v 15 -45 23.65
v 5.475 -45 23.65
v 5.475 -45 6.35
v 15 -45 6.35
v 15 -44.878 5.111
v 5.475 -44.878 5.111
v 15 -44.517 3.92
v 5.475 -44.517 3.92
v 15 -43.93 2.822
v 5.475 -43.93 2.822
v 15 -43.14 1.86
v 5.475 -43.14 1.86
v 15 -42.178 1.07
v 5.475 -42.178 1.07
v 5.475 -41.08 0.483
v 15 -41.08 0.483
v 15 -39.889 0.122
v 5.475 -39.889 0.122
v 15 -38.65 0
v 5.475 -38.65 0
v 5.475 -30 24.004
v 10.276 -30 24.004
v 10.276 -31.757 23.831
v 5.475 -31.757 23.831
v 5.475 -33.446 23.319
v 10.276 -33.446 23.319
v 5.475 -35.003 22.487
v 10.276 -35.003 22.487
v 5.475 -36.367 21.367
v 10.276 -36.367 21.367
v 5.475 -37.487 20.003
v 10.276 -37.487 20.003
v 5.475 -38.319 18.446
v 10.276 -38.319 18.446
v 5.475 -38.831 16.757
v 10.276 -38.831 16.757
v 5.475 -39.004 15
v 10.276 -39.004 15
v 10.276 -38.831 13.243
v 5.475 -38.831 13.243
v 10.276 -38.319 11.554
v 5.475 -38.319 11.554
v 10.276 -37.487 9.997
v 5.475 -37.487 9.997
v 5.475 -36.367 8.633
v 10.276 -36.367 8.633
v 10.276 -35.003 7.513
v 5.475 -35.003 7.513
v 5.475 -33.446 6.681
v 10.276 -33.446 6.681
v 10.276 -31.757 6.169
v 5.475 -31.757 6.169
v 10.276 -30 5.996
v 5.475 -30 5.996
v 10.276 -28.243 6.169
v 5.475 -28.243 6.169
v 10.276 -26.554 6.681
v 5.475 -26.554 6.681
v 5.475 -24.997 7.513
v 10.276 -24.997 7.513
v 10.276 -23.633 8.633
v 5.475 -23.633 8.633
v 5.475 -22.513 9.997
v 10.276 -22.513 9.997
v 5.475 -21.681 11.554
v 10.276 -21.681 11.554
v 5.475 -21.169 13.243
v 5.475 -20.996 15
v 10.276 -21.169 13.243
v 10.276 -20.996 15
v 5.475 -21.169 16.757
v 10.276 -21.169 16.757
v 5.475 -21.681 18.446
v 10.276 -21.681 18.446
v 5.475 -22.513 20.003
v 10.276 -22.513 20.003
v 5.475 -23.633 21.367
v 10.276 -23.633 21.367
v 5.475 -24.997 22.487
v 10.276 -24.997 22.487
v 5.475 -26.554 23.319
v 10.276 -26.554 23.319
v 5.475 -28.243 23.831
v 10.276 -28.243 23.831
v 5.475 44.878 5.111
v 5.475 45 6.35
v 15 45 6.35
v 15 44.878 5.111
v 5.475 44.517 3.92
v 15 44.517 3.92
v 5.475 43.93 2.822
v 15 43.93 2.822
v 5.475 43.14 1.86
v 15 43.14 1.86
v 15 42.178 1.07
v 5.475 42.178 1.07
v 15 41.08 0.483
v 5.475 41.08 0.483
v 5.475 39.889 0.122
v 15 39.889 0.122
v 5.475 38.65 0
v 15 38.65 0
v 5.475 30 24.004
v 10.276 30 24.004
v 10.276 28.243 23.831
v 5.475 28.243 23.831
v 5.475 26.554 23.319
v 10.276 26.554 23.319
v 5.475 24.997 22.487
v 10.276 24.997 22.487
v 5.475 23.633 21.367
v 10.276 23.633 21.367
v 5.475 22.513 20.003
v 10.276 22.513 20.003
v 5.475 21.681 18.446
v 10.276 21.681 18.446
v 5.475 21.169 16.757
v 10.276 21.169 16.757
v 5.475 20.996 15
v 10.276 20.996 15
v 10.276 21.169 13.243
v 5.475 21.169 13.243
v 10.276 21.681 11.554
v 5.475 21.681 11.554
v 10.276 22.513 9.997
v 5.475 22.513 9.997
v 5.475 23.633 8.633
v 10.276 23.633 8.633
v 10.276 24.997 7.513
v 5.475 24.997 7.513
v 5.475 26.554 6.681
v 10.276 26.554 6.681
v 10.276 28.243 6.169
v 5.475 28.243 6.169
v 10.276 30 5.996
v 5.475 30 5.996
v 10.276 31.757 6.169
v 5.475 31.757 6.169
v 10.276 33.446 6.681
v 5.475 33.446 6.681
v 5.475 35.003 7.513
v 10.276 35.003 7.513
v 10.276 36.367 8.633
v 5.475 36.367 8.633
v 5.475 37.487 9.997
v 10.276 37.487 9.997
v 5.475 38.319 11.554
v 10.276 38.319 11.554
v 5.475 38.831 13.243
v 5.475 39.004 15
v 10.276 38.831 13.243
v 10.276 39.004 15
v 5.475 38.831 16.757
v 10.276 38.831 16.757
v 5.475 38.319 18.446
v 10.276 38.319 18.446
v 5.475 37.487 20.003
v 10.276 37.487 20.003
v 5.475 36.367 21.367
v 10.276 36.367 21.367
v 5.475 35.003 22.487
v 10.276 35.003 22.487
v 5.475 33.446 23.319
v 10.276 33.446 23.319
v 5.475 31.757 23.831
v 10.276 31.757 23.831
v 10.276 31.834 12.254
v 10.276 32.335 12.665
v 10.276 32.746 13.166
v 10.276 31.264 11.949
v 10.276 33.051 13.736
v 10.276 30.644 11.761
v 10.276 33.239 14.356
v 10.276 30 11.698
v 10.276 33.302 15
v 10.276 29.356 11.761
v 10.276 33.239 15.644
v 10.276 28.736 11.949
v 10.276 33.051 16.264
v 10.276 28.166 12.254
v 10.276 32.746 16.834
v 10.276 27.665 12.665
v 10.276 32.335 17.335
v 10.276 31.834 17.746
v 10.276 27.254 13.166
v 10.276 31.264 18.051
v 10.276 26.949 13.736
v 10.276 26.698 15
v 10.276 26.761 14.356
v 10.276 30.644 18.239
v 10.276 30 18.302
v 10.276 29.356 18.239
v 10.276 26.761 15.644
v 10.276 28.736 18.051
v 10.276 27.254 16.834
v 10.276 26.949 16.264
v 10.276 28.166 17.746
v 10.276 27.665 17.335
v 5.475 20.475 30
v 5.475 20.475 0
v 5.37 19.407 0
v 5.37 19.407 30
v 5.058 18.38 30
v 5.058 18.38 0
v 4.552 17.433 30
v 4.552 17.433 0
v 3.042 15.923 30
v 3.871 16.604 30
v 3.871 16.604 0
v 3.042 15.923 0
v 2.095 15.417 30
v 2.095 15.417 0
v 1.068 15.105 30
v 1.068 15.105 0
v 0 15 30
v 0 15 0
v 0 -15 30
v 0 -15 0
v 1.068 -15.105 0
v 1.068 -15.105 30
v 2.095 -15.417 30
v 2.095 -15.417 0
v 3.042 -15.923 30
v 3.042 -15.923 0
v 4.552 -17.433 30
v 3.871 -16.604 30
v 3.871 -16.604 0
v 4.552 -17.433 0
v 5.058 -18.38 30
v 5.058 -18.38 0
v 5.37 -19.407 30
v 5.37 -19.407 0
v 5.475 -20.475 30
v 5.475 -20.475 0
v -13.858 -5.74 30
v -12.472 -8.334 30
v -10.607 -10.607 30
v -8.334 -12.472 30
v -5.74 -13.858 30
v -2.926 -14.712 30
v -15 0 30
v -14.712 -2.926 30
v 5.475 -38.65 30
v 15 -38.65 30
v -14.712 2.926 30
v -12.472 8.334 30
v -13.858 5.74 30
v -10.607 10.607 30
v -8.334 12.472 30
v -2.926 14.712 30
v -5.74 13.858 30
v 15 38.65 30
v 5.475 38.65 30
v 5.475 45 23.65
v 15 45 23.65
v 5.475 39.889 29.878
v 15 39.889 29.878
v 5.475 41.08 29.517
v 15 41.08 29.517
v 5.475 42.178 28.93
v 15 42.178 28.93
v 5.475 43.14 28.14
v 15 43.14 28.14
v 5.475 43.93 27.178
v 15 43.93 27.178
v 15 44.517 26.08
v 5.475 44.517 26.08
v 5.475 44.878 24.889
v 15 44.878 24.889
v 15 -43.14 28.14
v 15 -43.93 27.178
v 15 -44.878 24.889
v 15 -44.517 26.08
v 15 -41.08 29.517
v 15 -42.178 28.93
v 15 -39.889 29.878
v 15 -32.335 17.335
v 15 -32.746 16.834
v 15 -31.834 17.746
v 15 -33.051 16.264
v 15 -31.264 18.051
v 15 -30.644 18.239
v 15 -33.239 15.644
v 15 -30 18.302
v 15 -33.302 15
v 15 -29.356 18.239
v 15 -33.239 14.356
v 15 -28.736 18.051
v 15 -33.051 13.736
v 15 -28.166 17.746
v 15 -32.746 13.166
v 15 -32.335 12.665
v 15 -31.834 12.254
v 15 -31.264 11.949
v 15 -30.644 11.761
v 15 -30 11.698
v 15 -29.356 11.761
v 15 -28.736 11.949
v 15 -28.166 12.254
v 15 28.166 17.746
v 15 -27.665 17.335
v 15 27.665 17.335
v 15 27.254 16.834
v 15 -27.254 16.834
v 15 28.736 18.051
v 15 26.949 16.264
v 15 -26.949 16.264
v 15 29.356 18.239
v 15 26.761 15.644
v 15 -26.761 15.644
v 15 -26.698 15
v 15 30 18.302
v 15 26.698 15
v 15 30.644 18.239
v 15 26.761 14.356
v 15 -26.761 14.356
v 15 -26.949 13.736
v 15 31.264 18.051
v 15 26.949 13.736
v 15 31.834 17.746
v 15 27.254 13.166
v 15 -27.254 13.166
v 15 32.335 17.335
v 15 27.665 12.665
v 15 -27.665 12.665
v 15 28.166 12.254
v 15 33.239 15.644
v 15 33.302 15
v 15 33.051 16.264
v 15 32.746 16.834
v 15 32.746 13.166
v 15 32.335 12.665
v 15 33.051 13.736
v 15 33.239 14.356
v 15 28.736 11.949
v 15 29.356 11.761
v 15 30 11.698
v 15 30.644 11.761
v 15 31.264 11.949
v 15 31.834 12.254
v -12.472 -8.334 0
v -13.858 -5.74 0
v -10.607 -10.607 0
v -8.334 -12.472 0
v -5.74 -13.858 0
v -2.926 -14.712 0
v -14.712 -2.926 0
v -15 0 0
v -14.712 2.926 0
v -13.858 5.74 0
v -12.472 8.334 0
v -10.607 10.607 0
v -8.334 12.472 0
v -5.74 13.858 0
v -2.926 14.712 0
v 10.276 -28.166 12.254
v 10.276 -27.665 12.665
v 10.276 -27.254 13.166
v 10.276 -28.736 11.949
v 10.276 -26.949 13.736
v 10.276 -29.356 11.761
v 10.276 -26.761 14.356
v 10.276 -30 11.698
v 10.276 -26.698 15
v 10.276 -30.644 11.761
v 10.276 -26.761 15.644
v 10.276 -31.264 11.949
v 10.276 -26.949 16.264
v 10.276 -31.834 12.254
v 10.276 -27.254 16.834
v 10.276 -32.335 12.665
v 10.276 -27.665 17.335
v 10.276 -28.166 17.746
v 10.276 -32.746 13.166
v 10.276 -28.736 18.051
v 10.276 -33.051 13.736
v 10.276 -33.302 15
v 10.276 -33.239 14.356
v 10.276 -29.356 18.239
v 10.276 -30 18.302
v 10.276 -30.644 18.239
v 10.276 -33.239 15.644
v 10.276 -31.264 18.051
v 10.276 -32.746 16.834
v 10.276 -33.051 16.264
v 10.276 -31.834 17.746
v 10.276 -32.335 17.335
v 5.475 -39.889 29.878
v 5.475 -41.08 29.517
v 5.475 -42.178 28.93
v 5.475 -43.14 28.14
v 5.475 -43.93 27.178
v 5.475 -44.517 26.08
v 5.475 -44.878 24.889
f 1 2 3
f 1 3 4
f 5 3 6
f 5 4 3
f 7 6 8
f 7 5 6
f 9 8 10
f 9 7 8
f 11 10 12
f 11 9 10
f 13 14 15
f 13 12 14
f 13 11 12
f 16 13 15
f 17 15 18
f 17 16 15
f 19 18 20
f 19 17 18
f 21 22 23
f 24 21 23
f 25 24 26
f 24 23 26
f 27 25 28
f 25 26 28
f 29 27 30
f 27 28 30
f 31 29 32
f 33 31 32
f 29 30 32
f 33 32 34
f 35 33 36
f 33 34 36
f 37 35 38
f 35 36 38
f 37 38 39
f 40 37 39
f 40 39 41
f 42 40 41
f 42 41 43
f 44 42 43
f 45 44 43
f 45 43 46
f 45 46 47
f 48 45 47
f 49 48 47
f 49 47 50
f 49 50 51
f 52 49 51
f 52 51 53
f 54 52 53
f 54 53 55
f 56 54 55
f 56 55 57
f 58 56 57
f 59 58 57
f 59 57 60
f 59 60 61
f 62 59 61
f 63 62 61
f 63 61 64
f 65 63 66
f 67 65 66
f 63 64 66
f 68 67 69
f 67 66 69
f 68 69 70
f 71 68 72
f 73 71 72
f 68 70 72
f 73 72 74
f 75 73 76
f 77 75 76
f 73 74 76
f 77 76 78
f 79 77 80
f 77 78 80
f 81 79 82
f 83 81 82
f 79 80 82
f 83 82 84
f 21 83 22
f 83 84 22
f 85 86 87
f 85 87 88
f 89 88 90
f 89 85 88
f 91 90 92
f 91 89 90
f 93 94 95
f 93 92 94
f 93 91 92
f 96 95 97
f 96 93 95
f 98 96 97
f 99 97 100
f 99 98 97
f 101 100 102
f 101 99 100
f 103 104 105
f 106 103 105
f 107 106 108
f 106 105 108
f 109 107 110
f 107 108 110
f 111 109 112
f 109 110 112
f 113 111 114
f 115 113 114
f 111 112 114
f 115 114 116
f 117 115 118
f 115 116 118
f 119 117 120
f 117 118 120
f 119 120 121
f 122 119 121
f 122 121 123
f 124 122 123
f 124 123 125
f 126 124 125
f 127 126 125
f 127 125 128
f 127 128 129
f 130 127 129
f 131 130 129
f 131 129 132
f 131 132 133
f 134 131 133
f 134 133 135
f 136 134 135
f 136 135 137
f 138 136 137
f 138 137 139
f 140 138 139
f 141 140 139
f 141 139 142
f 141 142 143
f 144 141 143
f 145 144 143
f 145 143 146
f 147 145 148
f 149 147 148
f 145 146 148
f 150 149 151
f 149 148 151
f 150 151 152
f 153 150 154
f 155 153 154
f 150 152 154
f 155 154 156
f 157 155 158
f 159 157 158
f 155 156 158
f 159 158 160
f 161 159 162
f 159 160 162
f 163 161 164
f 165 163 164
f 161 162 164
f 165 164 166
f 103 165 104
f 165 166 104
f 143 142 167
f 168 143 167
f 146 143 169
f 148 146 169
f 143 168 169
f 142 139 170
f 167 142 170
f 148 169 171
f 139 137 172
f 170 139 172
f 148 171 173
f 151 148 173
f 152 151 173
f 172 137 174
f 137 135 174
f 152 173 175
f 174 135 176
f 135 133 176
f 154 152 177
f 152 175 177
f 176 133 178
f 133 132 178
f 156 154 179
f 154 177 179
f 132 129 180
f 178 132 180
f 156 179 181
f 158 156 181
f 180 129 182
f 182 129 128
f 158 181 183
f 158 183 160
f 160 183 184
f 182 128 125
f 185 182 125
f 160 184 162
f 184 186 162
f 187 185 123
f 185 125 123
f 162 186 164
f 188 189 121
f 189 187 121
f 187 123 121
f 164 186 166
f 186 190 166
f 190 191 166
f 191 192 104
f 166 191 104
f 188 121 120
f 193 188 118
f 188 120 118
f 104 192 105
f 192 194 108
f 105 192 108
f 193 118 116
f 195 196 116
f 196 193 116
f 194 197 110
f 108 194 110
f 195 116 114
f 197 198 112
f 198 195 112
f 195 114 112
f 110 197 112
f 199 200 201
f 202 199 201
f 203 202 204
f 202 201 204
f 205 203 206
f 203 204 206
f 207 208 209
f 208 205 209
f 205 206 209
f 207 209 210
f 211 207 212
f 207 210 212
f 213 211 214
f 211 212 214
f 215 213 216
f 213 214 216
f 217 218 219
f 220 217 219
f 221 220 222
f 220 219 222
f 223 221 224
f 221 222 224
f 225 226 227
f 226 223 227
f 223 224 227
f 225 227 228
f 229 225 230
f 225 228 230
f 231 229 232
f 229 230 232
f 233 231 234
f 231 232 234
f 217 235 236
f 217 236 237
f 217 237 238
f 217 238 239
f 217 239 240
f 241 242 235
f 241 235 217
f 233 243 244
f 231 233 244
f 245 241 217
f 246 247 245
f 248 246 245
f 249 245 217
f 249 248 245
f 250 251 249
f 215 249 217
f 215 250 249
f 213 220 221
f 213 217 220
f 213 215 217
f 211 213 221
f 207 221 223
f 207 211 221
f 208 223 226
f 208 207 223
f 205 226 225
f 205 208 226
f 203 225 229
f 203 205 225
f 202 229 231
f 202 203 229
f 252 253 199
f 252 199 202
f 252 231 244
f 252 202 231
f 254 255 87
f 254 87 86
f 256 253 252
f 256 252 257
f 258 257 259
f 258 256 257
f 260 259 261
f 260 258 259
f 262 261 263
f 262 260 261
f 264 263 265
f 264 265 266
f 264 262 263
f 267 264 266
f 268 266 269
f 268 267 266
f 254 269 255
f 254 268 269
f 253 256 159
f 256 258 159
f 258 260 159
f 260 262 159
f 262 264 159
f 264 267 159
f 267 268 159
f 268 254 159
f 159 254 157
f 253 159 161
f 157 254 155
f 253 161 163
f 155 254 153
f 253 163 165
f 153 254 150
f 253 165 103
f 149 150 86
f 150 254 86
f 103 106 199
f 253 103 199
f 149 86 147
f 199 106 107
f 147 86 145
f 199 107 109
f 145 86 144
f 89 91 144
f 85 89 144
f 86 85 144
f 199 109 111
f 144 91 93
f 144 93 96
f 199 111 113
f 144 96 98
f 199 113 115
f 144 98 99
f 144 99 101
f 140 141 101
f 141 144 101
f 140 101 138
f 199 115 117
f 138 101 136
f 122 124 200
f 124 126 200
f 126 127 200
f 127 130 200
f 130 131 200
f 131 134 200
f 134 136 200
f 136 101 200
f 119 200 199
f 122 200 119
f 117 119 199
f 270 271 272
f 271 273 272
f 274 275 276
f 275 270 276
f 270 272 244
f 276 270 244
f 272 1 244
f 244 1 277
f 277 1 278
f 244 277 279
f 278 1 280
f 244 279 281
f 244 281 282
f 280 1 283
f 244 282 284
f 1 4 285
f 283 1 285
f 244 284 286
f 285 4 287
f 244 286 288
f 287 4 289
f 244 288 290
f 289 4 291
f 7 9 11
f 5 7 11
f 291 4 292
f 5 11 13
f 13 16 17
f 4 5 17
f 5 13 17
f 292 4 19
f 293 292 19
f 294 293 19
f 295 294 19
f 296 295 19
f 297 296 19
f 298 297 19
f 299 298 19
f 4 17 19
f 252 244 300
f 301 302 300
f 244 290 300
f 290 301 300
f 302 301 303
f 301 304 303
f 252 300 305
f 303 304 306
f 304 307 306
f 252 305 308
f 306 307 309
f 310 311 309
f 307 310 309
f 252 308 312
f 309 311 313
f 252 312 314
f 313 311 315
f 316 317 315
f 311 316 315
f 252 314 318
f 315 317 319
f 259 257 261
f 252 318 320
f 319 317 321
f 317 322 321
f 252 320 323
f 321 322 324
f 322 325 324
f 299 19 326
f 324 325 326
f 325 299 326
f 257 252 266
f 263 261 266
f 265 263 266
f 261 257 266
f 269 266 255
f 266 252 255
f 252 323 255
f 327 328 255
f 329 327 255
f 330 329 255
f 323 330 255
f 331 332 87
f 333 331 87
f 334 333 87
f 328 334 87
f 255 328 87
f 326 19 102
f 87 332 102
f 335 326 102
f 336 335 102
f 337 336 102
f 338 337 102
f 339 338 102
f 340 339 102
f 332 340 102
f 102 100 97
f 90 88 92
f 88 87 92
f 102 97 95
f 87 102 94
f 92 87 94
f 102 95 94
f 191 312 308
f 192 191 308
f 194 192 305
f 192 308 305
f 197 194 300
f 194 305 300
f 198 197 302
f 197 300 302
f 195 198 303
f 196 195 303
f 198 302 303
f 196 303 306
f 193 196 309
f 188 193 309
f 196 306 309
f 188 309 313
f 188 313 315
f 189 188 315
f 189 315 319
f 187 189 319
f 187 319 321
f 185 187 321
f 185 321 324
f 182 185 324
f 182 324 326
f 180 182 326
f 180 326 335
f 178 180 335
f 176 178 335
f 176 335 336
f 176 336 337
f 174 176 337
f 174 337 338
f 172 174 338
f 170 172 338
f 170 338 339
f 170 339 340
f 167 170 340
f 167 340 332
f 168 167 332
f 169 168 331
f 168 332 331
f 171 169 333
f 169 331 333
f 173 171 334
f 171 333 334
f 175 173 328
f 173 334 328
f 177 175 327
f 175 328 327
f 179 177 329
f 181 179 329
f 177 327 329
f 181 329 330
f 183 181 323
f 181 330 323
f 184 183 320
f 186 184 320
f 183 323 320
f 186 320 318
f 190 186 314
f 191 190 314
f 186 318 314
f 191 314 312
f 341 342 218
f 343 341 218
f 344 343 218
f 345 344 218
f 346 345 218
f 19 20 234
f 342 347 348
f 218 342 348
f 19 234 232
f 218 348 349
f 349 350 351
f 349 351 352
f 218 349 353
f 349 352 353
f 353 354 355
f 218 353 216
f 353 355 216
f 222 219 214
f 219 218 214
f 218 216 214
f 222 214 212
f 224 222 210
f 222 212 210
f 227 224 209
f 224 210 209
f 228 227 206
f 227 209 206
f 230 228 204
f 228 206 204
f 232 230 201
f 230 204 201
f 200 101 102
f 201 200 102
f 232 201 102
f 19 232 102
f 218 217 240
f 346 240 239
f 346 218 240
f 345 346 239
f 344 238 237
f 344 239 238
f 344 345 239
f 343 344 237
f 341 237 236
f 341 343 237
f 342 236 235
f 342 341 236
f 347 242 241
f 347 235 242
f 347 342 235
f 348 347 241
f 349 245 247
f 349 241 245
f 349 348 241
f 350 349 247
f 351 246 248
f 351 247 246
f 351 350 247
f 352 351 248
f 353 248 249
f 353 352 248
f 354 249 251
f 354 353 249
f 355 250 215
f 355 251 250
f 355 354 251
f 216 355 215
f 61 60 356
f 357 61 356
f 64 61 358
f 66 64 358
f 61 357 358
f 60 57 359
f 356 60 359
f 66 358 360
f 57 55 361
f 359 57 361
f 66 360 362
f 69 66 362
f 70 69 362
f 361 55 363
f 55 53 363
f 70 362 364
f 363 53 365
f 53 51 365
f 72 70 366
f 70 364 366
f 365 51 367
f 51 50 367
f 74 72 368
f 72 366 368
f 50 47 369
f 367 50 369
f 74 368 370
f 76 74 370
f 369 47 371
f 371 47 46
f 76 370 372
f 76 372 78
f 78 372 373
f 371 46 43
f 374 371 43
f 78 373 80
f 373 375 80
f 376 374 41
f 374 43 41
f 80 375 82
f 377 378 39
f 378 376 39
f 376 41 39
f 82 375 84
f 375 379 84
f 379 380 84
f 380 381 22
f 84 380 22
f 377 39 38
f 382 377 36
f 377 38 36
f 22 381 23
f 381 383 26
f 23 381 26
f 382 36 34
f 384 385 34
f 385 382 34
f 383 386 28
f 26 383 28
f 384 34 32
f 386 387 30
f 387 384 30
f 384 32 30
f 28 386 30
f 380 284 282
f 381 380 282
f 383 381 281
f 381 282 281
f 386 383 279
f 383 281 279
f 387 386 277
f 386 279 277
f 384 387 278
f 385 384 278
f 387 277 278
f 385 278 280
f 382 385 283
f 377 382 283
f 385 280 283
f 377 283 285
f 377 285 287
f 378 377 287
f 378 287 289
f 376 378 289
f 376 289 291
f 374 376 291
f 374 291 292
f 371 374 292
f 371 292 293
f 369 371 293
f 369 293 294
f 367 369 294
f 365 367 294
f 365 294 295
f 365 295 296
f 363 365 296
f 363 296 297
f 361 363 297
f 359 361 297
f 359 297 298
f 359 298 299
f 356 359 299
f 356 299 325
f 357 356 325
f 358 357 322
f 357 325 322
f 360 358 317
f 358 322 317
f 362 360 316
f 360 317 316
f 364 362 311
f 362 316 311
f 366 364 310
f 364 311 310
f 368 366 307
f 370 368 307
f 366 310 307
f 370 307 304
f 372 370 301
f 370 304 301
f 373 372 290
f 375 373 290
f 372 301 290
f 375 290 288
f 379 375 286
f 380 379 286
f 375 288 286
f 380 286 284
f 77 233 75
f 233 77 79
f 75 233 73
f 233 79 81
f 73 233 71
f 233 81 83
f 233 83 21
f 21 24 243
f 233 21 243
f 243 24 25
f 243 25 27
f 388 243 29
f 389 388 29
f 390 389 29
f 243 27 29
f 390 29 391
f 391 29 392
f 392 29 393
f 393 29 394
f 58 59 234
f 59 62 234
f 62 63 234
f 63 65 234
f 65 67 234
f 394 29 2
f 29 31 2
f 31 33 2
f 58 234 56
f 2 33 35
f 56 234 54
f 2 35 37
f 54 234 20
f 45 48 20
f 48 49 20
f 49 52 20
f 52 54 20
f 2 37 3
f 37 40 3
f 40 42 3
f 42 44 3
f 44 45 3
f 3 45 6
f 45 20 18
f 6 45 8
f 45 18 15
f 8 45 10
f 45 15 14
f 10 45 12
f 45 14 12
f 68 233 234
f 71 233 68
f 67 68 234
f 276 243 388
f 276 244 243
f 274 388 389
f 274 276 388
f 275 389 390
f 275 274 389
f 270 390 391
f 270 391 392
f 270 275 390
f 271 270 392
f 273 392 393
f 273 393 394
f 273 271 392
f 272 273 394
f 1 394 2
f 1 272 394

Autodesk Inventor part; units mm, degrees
ref_plane "YZ Plane" through (0, 0, 0) normal (1, 0, 0) x (0, 1, 0)
ref_plane "XZ Plane" through (0, 0, 0) normal (0, 1, 0) x (-1, 0, 0)
ref_plane "XY Plane" through (0, 0, 0) normal (0, 0, 1) x (1, 0, 0)
sketch "Sketch1" plane through (0, 0, 0) normal (0, 0, 1) x (1, 0, 0)
  line L0 (5.475, -45) -> (15, -45)
  line L1 (15, -45) -> (15, 45)
  line L2 (15, 45) -> (5.475, 45)
  line L3 (5.475, -45) -> (15, 45) construction
  line L4 (15, -45) -> (5.475, 45) construction
  arc A0 (0, 15) -> (5.475, 20.475) centre (0, 20.475) ccw
  line L5 (5.475, 0) -> (15, 0) construction
  arc A1 (5.475, -20.475) -> (0, -15) centre (0, -20.475) ccw
  line L6 (5.475, 45) -> (5.475, 20.475)
  line L7 (5.475, -20.475) -> (5.475, -45)
  arc A2 (0, 15) -> (0, -15) centre (0, 0) ccw
  point P0 (10.2375, 0)
  point P1 (10.2375, 0)
  dimension "d1" = 90
  dimension "d2" = 9.525
  dimension "d3" = 15
extrude "Extrusion1" add sketch "Sketch1" along normal blind 30
sketch "Sketch2" plane through (5.475, 20.475, 0) normal (-1, 0, 0) x (0, 0, 1)
  line L0 (0, -65.475) -> (30, -65.475) projected
  line L1 (0, 24.525) -> (30, 24.525) projected
  point P0 (0, -20.475)
  point P1 (15, 9.525)
  point P2 (15, -50.475)
  point P3 (15, -65.475)
  dimension "d6" = 15
  dimension "d7" = 15
hole "Hole1" at (5.475, 30, 15) at (5.475, -30, 15) direction (1, 0, 0) diameter 6.604 end through all counterbore diameter 18.0086 counterbore depth 4.8006 clearance for "Hex Head Cap Screw DIN EN 24017" size "M6" standard "DIN"
fillet "Fillet1" radius 6.35 4 edges at (10.2375, -45, 30) (10.2375, 45, 30) (10.2375, 45, 0) (10.2375, -45, 0)
properties part number "NASA-20-ARM-BR-01"
